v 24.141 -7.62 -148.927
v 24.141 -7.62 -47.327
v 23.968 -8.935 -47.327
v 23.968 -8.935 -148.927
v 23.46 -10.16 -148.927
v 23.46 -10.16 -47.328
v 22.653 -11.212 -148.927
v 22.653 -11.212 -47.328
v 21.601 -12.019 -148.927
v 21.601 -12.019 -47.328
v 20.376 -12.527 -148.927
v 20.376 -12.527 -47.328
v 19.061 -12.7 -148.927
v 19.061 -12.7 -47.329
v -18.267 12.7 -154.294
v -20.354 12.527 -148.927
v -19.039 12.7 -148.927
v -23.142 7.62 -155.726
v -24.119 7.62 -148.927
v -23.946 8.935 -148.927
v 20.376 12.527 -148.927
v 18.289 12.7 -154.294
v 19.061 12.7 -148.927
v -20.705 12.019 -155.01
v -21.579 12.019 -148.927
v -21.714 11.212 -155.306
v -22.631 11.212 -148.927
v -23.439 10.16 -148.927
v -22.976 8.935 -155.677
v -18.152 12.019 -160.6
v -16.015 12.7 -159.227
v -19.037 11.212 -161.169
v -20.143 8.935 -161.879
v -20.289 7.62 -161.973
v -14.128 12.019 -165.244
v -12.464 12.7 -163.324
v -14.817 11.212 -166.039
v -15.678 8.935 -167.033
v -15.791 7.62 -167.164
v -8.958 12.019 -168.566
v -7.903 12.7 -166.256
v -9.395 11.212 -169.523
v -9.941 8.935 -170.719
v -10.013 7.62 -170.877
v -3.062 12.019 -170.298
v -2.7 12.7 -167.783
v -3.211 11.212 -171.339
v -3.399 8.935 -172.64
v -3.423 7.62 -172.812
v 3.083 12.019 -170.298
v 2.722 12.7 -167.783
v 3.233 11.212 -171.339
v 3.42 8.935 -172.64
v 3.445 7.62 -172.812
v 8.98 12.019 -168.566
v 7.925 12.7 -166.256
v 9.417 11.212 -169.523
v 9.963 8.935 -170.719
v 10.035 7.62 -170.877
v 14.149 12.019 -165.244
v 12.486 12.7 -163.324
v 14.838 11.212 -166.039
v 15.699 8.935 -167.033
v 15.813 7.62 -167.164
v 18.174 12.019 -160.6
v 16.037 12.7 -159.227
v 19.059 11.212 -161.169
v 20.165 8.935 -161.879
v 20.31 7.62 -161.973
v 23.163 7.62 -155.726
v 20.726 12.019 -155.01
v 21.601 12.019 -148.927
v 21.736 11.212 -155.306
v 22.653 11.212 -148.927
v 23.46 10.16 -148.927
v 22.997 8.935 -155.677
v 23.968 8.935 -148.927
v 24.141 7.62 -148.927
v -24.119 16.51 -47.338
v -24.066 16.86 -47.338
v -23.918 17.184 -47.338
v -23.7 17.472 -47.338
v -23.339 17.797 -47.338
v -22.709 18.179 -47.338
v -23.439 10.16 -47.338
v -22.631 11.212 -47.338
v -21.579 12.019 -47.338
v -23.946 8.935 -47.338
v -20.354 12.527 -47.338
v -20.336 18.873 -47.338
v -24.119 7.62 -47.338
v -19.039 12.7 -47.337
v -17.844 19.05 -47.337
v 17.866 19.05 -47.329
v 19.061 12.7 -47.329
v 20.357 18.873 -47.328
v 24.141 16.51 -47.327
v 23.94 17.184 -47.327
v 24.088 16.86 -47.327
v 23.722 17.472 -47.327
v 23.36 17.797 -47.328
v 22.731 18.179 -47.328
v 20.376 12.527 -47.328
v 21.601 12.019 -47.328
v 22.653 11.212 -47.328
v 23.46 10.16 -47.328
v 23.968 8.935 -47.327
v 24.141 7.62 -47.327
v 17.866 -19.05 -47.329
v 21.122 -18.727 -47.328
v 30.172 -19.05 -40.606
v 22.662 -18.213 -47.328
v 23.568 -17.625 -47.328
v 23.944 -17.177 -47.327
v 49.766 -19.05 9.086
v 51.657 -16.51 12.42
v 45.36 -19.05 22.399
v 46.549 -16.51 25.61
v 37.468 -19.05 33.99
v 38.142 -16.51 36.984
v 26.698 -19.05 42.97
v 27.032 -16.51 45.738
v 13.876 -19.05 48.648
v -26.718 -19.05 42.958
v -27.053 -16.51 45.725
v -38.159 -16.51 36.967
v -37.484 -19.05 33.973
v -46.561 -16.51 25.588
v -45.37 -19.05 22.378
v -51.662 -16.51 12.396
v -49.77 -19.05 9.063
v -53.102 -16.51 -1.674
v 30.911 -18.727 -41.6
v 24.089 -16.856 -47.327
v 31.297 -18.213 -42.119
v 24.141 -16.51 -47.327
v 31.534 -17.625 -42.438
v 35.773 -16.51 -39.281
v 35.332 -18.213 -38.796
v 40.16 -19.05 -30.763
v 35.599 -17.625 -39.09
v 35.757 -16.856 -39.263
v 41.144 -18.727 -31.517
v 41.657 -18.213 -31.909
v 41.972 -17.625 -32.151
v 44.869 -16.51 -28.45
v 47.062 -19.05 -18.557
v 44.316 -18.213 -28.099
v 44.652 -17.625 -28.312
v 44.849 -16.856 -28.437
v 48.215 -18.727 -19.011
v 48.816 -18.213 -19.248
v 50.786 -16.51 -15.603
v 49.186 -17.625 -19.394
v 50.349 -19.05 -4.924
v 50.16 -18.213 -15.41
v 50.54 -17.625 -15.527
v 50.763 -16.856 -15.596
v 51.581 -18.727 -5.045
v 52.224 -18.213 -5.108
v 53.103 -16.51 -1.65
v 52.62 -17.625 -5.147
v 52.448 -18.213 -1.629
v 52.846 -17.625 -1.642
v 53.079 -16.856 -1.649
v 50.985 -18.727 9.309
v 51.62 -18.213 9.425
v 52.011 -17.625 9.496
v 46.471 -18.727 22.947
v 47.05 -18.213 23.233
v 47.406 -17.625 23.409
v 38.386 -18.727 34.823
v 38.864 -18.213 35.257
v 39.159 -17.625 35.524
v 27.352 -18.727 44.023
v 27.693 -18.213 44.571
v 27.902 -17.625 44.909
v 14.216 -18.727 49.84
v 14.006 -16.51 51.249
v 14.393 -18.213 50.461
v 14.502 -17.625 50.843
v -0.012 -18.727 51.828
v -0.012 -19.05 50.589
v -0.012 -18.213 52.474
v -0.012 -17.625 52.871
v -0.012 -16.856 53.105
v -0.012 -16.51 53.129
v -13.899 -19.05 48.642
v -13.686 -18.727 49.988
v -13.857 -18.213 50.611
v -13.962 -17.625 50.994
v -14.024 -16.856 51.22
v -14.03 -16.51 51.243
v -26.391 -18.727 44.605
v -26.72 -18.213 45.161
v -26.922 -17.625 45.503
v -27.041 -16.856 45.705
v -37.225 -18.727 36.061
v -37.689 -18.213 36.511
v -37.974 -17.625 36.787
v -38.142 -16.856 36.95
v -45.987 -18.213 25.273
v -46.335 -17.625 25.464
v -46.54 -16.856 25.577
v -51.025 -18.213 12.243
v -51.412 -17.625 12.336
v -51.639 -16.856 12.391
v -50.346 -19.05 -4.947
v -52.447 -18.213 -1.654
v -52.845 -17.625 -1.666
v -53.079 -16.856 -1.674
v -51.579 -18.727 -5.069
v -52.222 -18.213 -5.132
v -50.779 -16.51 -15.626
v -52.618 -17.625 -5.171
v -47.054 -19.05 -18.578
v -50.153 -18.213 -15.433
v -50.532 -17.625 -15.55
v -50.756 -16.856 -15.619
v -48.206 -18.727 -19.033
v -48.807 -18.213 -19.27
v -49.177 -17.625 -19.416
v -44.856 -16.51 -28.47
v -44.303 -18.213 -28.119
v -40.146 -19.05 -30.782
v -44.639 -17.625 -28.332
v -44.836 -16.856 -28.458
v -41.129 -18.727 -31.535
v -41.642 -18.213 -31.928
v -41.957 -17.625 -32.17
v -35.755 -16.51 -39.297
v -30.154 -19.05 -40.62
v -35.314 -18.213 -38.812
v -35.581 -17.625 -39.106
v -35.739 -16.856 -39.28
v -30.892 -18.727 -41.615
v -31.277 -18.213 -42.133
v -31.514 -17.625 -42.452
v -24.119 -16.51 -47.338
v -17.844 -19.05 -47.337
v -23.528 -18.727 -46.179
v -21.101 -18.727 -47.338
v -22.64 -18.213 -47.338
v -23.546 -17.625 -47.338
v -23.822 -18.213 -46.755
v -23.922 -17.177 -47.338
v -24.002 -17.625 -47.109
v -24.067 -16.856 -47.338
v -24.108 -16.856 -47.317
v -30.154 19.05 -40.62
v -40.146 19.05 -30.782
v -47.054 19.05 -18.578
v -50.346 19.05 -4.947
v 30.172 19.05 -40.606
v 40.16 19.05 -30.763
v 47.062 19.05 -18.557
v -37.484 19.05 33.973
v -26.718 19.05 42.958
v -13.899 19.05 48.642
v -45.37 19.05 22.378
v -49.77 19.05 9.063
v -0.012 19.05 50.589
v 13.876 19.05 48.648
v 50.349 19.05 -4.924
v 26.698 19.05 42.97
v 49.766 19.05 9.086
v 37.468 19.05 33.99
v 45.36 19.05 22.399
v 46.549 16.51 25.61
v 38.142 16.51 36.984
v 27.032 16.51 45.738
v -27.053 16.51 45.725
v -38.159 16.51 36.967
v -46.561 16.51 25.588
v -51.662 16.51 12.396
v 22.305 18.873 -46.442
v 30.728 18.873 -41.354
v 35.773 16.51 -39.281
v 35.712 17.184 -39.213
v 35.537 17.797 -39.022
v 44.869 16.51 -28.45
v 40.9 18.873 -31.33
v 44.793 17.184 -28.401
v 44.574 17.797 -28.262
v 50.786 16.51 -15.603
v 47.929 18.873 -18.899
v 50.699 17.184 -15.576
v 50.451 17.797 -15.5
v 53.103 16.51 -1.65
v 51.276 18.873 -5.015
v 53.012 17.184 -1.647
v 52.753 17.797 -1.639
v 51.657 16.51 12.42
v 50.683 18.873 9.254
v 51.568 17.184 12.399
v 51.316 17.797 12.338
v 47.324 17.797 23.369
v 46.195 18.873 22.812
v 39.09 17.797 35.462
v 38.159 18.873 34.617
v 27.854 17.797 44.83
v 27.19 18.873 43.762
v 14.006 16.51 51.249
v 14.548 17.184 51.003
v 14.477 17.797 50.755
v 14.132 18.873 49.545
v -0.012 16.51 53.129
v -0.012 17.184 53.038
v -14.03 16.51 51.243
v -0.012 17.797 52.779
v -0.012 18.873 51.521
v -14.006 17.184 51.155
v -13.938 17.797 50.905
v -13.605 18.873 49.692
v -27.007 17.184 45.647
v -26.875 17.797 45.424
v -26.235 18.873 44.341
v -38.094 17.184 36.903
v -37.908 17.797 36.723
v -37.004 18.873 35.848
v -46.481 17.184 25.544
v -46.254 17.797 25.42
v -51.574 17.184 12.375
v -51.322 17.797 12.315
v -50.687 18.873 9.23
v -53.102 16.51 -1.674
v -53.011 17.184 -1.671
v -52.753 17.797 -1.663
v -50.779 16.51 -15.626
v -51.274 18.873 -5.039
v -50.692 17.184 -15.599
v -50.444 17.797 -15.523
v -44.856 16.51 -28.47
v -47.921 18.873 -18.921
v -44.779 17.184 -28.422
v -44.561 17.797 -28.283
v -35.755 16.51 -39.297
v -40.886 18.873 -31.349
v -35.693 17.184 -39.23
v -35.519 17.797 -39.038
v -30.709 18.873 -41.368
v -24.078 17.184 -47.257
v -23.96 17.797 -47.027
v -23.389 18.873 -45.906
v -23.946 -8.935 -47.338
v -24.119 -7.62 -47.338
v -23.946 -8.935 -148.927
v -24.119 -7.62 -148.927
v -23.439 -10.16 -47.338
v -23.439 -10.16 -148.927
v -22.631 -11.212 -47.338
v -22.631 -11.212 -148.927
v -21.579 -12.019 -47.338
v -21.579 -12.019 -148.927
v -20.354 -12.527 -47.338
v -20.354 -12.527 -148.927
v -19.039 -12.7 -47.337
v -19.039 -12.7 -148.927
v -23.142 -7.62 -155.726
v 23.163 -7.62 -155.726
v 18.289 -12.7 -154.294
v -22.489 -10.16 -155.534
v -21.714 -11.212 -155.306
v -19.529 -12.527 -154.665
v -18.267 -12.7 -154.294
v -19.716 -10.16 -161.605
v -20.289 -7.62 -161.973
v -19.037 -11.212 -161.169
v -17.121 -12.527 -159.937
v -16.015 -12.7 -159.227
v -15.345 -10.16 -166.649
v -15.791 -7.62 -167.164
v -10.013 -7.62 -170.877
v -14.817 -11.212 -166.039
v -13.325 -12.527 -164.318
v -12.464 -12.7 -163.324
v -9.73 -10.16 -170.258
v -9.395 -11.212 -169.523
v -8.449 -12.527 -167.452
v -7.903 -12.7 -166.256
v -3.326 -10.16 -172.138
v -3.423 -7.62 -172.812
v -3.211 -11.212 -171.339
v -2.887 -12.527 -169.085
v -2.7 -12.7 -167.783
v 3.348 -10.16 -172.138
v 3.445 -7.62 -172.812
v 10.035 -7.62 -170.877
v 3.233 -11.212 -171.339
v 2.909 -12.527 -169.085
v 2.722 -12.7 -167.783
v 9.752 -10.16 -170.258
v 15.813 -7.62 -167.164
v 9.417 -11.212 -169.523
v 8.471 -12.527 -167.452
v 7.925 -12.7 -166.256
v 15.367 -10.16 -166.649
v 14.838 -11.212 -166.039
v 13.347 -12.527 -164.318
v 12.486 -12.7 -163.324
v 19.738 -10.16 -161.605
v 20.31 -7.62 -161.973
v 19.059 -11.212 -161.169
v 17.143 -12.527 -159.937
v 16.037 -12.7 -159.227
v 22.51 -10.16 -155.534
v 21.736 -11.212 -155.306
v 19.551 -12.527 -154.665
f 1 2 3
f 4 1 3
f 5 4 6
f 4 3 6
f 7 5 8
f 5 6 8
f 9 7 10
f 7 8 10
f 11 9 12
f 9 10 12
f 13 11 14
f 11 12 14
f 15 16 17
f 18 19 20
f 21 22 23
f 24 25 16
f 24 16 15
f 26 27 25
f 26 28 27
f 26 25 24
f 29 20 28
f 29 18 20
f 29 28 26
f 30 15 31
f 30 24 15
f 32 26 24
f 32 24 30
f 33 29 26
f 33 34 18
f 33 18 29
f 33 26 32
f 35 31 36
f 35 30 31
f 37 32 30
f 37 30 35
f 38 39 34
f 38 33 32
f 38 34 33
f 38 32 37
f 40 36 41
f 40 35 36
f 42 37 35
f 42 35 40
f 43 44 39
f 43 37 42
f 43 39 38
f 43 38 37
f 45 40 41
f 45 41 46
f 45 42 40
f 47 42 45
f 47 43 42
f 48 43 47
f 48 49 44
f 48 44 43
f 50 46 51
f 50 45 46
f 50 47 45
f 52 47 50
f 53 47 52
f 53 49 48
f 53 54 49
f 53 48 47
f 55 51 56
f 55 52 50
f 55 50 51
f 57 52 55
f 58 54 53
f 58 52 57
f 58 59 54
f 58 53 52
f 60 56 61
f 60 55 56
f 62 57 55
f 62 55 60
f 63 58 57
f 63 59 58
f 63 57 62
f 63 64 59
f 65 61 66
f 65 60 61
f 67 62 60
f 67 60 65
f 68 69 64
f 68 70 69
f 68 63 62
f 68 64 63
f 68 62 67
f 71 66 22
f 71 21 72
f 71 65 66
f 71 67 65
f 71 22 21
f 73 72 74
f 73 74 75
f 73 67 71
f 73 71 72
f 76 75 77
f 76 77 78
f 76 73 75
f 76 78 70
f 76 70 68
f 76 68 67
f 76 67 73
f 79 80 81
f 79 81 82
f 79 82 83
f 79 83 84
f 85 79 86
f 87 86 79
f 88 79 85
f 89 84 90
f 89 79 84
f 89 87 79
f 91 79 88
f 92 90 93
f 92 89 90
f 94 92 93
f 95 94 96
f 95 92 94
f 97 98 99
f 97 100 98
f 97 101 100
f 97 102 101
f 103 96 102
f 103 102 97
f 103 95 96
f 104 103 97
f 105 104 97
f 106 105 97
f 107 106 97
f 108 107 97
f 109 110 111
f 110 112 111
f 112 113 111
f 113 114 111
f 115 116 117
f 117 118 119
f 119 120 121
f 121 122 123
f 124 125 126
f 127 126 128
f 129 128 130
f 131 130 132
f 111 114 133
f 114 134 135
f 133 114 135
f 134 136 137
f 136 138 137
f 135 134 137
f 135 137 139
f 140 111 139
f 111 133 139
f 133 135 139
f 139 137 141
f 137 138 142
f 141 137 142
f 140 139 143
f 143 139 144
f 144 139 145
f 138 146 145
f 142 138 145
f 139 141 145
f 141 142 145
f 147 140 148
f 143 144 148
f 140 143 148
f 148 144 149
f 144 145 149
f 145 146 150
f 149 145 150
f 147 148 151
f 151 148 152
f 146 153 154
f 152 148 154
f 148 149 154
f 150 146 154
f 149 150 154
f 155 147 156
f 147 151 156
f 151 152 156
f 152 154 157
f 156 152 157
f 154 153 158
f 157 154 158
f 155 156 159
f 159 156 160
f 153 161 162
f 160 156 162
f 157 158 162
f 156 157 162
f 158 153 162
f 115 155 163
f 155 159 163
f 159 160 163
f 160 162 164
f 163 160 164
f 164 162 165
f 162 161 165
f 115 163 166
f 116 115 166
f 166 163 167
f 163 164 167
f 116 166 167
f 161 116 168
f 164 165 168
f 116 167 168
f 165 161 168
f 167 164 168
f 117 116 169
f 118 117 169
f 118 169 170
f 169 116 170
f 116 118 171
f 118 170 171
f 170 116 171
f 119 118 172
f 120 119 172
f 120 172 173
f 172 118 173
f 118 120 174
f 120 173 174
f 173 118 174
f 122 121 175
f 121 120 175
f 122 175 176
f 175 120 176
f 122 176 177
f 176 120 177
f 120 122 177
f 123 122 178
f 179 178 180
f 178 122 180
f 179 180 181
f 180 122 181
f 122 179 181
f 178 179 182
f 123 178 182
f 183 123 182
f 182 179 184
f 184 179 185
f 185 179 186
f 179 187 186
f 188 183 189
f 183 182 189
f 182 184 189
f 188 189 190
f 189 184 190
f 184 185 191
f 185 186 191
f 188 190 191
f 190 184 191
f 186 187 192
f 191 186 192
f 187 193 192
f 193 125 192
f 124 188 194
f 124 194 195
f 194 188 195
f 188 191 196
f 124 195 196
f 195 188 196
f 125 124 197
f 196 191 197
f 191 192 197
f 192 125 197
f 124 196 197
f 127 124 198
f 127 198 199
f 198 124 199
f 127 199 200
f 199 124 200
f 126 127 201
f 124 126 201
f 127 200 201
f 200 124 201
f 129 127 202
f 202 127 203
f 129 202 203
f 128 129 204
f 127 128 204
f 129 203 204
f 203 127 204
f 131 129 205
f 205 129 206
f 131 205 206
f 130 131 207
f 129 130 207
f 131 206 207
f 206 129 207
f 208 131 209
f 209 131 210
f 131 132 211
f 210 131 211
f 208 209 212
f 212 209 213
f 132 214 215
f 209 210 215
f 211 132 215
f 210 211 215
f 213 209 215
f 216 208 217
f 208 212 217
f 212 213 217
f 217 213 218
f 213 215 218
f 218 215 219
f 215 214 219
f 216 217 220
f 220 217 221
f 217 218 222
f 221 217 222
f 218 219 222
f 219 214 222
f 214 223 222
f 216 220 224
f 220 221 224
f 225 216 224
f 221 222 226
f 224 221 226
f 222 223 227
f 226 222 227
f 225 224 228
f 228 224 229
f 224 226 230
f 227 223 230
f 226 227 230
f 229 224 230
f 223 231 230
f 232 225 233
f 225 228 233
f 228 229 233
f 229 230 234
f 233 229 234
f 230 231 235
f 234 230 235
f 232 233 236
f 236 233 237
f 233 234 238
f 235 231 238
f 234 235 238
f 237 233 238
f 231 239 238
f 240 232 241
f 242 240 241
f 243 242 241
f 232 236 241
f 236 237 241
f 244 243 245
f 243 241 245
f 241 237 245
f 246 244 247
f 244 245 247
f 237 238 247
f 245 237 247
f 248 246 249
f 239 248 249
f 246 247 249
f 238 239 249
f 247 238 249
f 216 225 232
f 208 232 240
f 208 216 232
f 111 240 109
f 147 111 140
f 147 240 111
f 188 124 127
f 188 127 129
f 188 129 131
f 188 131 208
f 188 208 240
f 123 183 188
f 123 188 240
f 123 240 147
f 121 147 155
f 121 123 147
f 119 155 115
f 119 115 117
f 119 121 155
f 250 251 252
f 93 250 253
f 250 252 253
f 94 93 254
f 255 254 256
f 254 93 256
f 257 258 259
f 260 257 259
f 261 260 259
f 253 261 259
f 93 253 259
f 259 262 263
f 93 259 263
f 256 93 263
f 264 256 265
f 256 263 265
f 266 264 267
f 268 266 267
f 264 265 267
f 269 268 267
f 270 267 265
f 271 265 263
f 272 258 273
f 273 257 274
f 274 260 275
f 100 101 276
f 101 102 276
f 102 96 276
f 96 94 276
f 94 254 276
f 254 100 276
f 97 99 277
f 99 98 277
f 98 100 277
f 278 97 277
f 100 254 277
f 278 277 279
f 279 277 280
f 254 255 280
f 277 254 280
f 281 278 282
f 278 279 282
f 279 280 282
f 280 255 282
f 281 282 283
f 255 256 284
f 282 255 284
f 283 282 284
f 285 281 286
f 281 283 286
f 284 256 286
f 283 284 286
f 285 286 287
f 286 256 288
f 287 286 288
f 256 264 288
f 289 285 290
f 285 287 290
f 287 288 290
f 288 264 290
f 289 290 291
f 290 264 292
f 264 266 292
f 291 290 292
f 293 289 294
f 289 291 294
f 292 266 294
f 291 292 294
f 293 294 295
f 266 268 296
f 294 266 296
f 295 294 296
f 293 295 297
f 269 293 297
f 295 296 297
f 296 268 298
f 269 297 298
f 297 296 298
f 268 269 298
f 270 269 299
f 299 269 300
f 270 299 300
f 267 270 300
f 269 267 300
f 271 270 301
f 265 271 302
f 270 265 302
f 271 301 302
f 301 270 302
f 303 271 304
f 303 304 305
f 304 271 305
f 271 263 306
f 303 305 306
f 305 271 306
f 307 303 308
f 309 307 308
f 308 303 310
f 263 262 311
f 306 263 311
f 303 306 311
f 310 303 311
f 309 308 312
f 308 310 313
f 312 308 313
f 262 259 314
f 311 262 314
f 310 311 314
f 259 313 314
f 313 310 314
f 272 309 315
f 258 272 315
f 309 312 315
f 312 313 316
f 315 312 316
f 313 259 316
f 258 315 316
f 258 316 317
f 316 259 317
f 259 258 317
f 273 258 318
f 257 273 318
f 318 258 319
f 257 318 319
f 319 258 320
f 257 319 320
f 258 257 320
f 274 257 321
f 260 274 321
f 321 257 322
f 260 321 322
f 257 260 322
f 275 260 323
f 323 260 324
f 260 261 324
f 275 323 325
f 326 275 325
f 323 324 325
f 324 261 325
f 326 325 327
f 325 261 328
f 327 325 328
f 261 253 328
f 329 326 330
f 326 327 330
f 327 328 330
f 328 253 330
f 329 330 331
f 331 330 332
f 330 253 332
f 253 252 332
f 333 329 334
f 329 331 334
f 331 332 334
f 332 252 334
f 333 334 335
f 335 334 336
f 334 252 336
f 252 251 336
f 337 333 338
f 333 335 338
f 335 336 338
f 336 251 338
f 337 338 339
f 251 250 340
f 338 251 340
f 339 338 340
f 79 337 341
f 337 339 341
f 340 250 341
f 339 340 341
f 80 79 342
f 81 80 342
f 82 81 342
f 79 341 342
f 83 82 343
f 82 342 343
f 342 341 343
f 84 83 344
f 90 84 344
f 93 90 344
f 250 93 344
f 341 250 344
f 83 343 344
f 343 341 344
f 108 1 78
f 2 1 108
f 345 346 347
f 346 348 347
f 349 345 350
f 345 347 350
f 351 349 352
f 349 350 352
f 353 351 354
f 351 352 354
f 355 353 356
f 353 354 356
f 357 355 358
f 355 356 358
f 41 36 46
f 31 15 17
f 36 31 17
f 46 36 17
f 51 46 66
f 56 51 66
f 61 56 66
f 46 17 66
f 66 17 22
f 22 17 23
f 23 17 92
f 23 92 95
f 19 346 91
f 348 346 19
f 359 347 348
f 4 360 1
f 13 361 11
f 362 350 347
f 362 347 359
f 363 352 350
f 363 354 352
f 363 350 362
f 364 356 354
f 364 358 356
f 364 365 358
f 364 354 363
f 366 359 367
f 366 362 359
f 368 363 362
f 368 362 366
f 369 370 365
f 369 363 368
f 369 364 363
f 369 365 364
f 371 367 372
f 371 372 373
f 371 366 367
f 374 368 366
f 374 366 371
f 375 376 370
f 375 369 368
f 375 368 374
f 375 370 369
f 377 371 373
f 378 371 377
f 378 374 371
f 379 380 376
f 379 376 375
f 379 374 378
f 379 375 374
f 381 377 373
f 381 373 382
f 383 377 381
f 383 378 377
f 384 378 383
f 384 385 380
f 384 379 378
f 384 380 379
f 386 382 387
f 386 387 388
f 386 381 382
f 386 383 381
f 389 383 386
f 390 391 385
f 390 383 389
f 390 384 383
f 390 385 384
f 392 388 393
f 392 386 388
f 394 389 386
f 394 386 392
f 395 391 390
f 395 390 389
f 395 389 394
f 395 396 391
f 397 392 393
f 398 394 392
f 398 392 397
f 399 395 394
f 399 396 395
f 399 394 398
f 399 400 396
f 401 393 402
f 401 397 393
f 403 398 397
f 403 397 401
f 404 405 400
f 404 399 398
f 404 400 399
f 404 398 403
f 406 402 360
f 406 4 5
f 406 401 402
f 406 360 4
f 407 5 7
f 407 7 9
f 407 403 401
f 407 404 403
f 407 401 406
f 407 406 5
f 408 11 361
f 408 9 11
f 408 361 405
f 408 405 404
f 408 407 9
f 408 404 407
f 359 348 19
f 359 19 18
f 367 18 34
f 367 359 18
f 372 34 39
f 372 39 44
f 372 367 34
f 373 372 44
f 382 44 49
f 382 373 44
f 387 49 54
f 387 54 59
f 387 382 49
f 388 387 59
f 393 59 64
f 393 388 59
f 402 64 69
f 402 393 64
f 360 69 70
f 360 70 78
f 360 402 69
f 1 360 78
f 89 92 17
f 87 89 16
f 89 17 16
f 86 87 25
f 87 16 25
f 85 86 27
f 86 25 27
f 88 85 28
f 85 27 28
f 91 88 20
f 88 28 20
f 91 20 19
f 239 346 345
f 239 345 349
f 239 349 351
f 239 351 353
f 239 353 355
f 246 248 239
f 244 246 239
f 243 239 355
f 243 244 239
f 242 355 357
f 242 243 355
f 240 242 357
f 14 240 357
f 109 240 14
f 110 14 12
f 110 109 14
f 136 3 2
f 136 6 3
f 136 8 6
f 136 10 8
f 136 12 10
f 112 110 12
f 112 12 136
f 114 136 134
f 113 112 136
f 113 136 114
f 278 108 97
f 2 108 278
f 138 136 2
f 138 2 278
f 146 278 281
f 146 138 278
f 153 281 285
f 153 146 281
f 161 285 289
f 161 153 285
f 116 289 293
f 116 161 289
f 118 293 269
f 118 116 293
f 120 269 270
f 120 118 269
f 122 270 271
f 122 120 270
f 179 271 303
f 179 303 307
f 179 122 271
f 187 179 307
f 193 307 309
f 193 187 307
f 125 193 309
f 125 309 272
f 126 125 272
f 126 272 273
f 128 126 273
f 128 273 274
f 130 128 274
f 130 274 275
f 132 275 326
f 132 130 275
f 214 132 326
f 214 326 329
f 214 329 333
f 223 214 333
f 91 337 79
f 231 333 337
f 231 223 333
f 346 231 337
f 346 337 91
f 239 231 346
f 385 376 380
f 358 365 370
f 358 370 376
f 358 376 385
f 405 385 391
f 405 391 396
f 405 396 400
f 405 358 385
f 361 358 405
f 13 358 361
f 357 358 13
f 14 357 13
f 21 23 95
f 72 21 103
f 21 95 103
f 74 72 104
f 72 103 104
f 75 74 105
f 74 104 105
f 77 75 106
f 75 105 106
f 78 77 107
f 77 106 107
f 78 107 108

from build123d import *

# Parameters (mm, degrees)
F1_DEPTH = 19.05
F2_R     = 2.54
F3_DEPTH = 12.7
F4_R     = 5.08


with BuildPart() as f1:
    # F0 (on Front) → F1 (new body, symmetric)
    with BuildSketch(Plane.XZ):
        with BuildLine():
            Line((-24.119121, -47.33848), (24.140879, -47.327388))
            ThreePointArc((24.140879, -47.327388), (-0.012211, 53.128745), (-24.119121, -47.33848))
        make_face()
    extrude(amount=F1_DEPTH, both=True)

    # F2
    f2_edges = [f1.edges().sort_by_distance(p)[0] for p in [
        (-0.012211, -19.05, 53.128745),
        (-0.012211, 19.05, 53.128745),
    ]]
    fillet(f2_edges, radius=F2_R)

    # F0 (on Front) → F3 (join, symmetric)
    with BuildSketch(Plane.XZ):
        with BuildLine():
            Line((24.140879, -148.927388), (24.140879, -47.327388))
            Line((24.140879, -47.327388), (-24.119121, -47.33848))
            Line((-24.119121, -47.33848), (-24.119121, -148.927388))
            ThreePointArc((-24.119121, -148.927388), (0.010879, -173.057388), (24.140879, -148.927388))
        make_face()
    extrude(amount=F3_DEPTH, both=True)

    # F4
    f4_edges = [f1.edges().sort_by_distance(p)[0] for p in [
        (-24.119121, 12.7, -98.132934),
        (-24.119121, -12.7, -98.132934),
        (24.140879, -12.7, -98.127388),
        (24.140879, 12.7, -98.127388),
    ]]
    fillet(f4_edges, radius=F4_R)


solid = f1.part
